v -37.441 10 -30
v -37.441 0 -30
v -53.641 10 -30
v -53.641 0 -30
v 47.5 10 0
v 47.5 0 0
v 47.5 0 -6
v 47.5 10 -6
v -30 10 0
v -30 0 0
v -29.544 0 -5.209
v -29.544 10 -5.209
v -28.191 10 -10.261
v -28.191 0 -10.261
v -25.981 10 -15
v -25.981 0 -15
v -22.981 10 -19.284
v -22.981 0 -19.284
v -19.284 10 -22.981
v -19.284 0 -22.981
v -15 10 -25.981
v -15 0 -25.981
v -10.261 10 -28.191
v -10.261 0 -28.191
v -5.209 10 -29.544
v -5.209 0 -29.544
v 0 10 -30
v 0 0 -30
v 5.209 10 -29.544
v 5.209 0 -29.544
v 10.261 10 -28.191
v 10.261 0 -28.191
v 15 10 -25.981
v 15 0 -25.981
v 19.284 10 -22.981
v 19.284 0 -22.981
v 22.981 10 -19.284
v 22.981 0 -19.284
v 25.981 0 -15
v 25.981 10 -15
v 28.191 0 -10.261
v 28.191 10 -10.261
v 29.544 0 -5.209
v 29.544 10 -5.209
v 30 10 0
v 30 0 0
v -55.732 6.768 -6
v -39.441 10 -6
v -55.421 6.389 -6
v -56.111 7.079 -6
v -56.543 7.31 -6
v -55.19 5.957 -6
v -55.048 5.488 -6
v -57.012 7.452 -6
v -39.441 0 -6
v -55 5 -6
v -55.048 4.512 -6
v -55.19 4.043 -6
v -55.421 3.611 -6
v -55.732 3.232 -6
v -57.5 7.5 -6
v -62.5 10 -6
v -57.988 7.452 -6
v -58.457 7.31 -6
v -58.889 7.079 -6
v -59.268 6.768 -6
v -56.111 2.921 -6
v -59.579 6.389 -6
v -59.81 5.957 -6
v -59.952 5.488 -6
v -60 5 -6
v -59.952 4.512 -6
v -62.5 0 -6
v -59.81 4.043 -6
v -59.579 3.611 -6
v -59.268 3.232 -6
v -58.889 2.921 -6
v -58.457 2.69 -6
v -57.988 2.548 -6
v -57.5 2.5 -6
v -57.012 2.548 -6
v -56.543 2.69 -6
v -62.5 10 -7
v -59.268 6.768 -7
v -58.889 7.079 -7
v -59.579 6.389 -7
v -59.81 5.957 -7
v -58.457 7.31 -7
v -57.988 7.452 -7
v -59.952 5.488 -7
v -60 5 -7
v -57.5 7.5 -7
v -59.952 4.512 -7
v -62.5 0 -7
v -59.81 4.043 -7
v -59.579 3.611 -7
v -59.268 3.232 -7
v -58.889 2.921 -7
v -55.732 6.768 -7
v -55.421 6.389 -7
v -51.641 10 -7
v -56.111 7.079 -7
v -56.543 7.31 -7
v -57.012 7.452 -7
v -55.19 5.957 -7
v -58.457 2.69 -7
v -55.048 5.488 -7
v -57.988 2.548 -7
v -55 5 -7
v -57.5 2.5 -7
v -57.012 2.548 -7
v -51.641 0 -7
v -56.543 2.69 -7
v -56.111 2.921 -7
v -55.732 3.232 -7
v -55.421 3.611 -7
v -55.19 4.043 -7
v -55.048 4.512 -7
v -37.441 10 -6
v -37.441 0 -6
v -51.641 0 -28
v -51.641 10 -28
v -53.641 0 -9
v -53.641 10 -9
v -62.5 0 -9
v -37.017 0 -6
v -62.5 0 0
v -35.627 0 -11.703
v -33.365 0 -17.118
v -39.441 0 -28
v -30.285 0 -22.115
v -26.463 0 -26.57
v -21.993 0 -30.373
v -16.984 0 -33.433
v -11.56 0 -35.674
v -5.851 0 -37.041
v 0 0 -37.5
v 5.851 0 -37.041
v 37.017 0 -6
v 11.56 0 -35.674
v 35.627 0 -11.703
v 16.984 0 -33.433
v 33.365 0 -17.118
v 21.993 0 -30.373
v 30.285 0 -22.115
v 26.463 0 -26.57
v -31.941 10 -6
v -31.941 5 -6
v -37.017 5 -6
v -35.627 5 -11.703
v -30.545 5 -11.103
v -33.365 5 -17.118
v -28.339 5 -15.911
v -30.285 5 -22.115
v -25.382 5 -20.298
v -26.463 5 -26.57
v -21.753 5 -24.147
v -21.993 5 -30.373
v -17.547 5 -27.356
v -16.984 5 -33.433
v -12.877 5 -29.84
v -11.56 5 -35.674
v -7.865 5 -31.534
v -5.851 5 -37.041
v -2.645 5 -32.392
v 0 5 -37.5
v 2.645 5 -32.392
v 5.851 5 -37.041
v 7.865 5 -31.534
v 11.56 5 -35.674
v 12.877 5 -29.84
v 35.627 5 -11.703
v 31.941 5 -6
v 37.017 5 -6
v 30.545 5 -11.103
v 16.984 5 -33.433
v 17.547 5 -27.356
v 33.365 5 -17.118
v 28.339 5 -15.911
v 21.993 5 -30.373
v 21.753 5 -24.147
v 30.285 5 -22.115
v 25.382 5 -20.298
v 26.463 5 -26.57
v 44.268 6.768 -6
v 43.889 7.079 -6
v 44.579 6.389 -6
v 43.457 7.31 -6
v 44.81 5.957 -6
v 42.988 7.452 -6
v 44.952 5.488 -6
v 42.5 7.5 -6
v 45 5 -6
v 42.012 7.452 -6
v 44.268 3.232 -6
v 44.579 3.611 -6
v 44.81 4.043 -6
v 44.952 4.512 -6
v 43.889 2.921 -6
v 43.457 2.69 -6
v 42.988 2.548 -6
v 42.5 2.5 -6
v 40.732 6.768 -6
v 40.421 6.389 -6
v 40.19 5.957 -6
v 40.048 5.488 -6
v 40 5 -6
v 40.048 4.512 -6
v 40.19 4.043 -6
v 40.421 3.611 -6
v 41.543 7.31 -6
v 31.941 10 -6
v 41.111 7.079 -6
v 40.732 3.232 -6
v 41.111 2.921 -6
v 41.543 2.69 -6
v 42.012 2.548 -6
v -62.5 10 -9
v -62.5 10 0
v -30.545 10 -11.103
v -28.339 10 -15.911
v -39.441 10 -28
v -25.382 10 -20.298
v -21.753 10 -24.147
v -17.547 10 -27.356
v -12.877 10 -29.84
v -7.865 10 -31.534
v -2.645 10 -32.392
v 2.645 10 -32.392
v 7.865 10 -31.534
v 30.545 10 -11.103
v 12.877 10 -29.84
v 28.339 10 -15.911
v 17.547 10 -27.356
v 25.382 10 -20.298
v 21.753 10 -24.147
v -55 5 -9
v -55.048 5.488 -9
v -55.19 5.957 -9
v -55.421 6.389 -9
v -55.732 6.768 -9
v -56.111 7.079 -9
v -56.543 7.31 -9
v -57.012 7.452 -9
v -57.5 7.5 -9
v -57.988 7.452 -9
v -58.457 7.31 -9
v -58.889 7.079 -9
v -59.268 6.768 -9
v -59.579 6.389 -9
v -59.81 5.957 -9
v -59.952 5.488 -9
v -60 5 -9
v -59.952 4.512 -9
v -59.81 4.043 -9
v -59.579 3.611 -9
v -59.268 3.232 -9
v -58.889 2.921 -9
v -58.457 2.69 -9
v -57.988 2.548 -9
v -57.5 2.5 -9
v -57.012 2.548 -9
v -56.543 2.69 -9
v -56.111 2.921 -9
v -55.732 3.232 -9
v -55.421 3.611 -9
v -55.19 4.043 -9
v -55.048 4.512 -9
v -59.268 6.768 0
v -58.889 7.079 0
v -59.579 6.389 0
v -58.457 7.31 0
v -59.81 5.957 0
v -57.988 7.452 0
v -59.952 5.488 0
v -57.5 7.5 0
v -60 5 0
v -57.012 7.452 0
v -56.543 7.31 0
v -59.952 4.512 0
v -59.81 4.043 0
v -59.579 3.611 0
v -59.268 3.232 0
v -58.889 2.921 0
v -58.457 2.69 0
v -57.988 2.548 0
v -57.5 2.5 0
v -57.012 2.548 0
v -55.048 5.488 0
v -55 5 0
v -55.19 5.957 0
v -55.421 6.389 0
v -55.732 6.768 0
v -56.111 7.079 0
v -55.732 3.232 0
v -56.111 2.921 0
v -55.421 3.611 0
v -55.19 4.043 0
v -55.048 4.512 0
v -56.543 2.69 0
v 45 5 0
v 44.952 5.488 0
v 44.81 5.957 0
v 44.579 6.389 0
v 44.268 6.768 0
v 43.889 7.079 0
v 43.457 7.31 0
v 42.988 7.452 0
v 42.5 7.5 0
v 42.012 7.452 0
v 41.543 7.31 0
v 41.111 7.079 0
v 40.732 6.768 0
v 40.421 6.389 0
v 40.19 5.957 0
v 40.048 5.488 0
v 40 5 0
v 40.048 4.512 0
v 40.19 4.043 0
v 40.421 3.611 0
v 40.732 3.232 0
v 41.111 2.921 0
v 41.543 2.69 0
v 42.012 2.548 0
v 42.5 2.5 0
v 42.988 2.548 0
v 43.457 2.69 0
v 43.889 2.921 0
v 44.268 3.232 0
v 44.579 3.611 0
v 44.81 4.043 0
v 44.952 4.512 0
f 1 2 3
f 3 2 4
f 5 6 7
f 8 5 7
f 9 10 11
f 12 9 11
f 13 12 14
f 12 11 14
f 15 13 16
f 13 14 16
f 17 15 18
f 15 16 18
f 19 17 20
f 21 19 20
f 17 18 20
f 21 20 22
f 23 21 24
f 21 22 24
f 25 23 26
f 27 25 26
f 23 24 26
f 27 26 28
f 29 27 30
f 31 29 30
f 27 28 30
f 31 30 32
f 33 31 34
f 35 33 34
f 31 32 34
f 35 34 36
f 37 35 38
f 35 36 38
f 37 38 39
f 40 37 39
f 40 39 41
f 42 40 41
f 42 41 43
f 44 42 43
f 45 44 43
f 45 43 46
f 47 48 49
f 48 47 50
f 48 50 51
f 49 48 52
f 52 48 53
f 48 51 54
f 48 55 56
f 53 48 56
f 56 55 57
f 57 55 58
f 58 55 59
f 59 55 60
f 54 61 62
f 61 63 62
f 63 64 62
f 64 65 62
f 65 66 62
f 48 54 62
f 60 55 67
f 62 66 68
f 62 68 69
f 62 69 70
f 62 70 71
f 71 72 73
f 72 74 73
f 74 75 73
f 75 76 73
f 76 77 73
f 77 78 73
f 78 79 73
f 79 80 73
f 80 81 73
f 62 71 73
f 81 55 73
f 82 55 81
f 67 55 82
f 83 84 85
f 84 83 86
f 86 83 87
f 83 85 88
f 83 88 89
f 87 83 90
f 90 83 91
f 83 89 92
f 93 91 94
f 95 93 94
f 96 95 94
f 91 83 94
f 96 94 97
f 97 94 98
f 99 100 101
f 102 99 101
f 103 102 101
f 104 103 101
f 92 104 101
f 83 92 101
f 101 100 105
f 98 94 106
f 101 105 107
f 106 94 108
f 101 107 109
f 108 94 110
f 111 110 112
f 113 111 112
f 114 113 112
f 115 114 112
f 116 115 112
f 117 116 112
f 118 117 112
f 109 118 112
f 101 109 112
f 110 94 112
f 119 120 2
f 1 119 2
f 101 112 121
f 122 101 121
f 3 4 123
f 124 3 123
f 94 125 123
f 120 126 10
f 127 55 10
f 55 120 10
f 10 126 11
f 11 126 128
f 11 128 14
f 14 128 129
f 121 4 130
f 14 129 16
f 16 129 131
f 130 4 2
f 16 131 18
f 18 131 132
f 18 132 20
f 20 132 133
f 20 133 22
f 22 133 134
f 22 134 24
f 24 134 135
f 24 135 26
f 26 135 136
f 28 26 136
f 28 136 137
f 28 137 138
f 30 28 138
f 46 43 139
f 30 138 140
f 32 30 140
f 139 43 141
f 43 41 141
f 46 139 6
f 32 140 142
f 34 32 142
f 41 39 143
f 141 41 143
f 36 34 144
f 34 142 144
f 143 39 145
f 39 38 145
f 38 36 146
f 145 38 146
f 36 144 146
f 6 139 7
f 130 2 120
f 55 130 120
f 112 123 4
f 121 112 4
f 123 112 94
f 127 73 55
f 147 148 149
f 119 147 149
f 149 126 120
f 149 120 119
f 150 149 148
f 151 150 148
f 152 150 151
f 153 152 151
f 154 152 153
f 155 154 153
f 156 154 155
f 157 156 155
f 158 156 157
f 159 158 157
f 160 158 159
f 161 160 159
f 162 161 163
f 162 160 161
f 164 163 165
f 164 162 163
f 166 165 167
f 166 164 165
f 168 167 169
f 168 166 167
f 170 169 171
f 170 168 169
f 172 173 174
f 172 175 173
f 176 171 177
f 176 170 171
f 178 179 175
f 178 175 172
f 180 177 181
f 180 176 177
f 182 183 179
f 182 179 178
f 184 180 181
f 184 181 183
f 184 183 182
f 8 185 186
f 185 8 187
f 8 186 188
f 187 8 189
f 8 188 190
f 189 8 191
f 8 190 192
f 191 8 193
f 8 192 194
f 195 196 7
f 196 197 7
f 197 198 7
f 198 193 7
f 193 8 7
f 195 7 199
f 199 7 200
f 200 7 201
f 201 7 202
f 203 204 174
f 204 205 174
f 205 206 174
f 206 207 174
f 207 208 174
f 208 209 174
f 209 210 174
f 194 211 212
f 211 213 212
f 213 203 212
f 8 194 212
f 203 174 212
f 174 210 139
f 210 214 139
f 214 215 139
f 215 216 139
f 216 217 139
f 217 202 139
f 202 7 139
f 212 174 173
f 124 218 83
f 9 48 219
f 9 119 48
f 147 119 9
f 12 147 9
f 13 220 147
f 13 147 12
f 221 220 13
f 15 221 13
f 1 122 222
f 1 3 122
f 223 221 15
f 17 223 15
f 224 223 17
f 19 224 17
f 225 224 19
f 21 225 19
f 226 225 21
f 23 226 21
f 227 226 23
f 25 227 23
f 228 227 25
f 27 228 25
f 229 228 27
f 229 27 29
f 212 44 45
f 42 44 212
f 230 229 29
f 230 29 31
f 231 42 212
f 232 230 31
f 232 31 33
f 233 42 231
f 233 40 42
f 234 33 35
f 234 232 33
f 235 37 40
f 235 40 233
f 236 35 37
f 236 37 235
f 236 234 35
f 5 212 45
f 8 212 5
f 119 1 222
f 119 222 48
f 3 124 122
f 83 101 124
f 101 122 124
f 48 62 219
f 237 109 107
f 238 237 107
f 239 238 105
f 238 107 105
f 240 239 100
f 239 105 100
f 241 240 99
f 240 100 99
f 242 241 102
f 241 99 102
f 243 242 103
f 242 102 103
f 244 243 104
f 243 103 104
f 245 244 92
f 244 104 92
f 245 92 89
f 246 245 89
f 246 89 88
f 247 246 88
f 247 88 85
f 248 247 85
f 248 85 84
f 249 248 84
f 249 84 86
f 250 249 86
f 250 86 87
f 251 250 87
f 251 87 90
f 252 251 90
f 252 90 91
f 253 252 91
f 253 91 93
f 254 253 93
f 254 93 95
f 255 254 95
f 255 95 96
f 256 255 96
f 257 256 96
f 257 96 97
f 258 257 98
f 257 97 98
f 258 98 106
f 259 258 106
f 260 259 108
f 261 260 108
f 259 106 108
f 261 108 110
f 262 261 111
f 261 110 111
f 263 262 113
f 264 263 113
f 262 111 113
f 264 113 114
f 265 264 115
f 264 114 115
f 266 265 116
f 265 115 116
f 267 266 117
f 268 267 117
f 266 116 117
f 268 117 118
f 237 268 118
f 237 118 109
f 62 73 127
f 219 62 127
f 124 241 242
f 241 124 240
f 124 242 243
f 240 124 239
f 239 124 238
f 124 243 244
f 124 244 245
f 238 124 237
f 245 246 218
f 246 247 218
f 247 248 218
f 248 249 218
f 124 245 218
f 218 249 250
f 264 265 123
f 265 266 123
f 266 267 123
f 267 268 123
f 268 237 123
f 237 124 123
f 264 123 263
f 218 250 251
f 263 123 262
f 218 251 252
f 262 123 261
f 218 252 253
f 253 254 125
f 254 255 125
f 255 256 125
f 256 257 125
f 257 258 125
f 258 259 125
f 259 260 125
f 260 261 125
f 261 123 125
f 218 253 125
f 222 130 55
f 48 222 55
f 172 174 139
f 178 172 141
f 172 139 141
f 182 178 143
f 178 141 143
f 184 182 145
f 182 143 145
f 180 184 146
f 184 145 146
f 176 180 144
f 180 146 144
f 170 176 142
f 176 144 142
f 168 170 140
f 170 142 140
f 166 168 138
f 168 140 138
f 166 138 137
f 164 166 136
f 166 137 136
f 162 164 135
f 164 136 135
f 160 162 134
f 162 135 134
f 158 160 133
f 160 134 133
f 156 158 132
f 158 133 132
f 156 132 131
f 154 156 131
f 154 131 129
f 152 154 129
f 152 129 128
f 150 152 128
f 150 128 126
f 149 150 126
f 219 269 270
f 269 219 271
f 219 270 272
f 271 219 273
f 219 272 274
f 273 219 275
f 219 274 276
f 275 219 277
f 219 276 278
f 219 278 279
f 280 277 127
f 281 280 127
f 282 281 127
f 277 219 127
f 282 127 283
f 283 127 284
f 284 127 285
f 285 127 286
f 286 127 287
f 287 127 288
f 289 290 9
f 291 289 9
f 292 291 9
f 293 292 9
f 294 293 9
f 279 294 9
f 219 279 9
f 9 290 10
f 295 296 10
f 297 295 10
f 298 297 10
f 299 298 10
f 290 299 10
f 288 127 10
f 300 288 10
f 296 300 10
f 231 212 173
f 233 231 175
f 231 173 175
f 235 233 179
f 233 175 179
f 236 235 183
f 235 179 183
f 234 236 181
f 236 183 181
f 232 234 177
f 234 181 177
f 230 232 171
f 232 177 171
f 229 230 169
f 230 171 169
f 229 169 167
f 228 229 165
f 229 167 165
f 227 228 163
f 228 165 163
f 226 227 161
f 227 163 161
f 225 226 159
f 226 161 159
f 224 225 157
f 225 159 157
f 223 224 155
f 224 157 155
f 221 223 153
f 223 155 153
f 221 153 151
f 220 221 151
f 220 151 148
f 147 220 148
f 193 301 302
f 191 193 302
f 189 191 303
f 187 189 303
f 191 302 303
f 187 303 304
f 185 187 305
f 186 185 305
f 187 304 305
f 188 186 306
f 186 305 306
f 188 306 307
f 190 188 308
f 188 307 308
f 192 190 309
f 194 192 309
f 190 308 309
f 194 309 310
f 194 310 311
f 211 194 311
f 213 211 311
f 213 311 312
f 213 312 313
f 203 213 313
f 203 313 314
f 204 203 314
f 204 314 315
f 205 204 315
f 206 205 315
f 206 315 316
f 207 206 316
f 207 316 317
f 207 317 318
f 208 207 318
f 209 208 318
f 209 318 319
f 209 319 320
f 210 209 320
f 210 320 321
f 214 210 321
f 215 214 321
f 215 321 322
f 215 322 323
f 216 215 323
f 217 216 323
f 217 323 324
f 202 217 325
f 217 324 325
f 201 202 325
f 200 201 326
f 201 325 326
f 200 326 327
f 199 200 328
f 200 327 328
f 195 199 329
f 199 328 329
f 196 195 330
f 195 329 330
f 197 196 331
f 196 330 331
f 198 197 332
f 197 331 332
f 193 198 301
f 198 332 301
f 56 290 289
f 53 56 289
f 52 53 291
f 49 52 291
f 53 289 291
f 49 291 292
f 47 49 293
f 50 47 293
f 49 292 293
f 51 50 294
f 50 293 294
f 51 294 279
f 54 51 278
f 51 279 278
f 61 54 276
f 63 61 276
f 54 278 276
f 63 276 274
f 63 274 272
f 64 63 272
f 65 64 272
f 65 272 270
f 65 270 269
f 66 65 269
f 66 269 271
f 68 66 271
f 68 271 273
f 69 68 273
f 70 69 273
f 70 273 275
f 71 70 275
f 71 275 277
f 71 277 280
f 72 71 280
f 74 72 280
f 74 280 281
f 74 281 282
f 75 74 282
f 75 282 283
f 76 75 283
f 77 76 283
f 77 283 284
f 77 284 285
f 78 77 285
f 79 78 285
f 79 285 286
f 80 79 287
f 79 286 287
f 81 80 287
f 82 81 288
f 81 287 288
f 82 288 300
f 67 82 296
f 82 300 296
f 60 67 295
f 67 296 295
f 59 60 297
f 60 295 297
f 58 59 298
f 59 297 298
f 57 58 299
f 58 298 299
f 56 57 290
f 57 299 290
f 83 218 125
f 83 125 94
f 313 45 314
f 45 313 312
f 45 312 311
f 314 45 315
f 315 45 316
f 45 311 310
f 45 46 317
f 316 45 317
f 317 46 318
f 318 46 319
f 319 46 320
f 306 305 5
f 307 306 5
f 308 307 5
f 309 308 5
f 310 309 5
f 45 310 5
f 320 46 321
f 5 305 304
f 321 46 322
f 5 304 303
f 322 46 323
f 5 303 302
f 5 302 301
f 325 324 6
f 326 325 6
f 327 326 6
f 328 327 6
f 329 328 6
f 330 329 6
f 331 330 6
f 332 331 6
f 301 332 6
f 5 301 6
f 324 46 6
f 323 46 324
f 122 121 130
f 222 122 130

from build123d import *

# Parameters (mm, degrees)
BOSS_EXTRUDE1_DEPTH = 10
BOSS_EXTRUDE2_DEPTH = 5
BOSS_EXTRUDE5_DEPTH = 10
SKETCH3_R           = 2.5
CUT_EXTRUDE4_DEPTH  = 30


with BuildPart() as part:
    # Sketch1 → Boss-Extrude1 (new body)
    with BuildSketch(Plane(origin=(0, 0, 0), x_dir=(1, 0, 0), z_dir=(0, 1, 0))):
        with BuildLine():
            Line((47.5, 6), (31.941352507, 6))
            ThreePointArc((31.941352507, 6), (0, 32.5), (-31.941352507, 6))
            Line((-31.941352507, 6), (-62.5, 6))
            Line((-62.5, 6), (-62.5, 0))
            Line((-62.5, 0), (-30, 0))
            ThreePointArc((-30, 0), (0, 30), (30, 0))
            Line((30, 0), (47.5, 0))
            Line((47.5, 0), (47.5, 6))
        make_face()
    extrude(amount=BOSS_EXTRUDE1_DEPTH)

    # Sketch5 → Boss-Extrude2 (add)
    with BuildSketch(Plane(origin=(0, 0, 0), x_dir=(1, 0, 0), z_dir=(0, 1, 0))):
        with BuildLine():
            ThreePointArc((37.5, 0), (0, 37.5), (-37.5, 0))
            Line((-37.5, 0), (-32.5, 0))
            ThreePointArc((-32.5, 0), (0, 32.5), (32.5, 0))
            Line((32.5, 0), (37.5, 0))
        make_face()
    extrude(amount=BOSS_EXTRUDE2_DEPTH)

    # Sketch1_5 → Boss-Extrude5 (add)
    with BuildSketch(Plane(origin=(0, 0, 0), x_dir=(1, 0, 0), z_dir=(0, 1, 0))):
        Polygon((-39.441352507, 6), (-37.441352507, 6), (-37.441352507, 30), (-53.641352507, 30), (-53.641352507, 9), (-62.5, 9), (-62.5, 7), (-51.641352507, 7), (-51.641352507, 28), (-39.441352507, 28), align=None)
    extrude(amount=BOSS_EXTRUDE5_DEPTH)

    # Sketch3 → Cut-Extrude4 (cut)
    with BuildSketch(Plane.XY):
        with Locations((-57.5, 5)):
            Circle(SKETCH3_R)
        with Locations((42.5, 5)):
            Circle(SKETCH3_R)
    extrude(amount=-CUT_EXTRUDE4_DEPTH, mode=Mode.SUBTRACT)


solid = part.part
